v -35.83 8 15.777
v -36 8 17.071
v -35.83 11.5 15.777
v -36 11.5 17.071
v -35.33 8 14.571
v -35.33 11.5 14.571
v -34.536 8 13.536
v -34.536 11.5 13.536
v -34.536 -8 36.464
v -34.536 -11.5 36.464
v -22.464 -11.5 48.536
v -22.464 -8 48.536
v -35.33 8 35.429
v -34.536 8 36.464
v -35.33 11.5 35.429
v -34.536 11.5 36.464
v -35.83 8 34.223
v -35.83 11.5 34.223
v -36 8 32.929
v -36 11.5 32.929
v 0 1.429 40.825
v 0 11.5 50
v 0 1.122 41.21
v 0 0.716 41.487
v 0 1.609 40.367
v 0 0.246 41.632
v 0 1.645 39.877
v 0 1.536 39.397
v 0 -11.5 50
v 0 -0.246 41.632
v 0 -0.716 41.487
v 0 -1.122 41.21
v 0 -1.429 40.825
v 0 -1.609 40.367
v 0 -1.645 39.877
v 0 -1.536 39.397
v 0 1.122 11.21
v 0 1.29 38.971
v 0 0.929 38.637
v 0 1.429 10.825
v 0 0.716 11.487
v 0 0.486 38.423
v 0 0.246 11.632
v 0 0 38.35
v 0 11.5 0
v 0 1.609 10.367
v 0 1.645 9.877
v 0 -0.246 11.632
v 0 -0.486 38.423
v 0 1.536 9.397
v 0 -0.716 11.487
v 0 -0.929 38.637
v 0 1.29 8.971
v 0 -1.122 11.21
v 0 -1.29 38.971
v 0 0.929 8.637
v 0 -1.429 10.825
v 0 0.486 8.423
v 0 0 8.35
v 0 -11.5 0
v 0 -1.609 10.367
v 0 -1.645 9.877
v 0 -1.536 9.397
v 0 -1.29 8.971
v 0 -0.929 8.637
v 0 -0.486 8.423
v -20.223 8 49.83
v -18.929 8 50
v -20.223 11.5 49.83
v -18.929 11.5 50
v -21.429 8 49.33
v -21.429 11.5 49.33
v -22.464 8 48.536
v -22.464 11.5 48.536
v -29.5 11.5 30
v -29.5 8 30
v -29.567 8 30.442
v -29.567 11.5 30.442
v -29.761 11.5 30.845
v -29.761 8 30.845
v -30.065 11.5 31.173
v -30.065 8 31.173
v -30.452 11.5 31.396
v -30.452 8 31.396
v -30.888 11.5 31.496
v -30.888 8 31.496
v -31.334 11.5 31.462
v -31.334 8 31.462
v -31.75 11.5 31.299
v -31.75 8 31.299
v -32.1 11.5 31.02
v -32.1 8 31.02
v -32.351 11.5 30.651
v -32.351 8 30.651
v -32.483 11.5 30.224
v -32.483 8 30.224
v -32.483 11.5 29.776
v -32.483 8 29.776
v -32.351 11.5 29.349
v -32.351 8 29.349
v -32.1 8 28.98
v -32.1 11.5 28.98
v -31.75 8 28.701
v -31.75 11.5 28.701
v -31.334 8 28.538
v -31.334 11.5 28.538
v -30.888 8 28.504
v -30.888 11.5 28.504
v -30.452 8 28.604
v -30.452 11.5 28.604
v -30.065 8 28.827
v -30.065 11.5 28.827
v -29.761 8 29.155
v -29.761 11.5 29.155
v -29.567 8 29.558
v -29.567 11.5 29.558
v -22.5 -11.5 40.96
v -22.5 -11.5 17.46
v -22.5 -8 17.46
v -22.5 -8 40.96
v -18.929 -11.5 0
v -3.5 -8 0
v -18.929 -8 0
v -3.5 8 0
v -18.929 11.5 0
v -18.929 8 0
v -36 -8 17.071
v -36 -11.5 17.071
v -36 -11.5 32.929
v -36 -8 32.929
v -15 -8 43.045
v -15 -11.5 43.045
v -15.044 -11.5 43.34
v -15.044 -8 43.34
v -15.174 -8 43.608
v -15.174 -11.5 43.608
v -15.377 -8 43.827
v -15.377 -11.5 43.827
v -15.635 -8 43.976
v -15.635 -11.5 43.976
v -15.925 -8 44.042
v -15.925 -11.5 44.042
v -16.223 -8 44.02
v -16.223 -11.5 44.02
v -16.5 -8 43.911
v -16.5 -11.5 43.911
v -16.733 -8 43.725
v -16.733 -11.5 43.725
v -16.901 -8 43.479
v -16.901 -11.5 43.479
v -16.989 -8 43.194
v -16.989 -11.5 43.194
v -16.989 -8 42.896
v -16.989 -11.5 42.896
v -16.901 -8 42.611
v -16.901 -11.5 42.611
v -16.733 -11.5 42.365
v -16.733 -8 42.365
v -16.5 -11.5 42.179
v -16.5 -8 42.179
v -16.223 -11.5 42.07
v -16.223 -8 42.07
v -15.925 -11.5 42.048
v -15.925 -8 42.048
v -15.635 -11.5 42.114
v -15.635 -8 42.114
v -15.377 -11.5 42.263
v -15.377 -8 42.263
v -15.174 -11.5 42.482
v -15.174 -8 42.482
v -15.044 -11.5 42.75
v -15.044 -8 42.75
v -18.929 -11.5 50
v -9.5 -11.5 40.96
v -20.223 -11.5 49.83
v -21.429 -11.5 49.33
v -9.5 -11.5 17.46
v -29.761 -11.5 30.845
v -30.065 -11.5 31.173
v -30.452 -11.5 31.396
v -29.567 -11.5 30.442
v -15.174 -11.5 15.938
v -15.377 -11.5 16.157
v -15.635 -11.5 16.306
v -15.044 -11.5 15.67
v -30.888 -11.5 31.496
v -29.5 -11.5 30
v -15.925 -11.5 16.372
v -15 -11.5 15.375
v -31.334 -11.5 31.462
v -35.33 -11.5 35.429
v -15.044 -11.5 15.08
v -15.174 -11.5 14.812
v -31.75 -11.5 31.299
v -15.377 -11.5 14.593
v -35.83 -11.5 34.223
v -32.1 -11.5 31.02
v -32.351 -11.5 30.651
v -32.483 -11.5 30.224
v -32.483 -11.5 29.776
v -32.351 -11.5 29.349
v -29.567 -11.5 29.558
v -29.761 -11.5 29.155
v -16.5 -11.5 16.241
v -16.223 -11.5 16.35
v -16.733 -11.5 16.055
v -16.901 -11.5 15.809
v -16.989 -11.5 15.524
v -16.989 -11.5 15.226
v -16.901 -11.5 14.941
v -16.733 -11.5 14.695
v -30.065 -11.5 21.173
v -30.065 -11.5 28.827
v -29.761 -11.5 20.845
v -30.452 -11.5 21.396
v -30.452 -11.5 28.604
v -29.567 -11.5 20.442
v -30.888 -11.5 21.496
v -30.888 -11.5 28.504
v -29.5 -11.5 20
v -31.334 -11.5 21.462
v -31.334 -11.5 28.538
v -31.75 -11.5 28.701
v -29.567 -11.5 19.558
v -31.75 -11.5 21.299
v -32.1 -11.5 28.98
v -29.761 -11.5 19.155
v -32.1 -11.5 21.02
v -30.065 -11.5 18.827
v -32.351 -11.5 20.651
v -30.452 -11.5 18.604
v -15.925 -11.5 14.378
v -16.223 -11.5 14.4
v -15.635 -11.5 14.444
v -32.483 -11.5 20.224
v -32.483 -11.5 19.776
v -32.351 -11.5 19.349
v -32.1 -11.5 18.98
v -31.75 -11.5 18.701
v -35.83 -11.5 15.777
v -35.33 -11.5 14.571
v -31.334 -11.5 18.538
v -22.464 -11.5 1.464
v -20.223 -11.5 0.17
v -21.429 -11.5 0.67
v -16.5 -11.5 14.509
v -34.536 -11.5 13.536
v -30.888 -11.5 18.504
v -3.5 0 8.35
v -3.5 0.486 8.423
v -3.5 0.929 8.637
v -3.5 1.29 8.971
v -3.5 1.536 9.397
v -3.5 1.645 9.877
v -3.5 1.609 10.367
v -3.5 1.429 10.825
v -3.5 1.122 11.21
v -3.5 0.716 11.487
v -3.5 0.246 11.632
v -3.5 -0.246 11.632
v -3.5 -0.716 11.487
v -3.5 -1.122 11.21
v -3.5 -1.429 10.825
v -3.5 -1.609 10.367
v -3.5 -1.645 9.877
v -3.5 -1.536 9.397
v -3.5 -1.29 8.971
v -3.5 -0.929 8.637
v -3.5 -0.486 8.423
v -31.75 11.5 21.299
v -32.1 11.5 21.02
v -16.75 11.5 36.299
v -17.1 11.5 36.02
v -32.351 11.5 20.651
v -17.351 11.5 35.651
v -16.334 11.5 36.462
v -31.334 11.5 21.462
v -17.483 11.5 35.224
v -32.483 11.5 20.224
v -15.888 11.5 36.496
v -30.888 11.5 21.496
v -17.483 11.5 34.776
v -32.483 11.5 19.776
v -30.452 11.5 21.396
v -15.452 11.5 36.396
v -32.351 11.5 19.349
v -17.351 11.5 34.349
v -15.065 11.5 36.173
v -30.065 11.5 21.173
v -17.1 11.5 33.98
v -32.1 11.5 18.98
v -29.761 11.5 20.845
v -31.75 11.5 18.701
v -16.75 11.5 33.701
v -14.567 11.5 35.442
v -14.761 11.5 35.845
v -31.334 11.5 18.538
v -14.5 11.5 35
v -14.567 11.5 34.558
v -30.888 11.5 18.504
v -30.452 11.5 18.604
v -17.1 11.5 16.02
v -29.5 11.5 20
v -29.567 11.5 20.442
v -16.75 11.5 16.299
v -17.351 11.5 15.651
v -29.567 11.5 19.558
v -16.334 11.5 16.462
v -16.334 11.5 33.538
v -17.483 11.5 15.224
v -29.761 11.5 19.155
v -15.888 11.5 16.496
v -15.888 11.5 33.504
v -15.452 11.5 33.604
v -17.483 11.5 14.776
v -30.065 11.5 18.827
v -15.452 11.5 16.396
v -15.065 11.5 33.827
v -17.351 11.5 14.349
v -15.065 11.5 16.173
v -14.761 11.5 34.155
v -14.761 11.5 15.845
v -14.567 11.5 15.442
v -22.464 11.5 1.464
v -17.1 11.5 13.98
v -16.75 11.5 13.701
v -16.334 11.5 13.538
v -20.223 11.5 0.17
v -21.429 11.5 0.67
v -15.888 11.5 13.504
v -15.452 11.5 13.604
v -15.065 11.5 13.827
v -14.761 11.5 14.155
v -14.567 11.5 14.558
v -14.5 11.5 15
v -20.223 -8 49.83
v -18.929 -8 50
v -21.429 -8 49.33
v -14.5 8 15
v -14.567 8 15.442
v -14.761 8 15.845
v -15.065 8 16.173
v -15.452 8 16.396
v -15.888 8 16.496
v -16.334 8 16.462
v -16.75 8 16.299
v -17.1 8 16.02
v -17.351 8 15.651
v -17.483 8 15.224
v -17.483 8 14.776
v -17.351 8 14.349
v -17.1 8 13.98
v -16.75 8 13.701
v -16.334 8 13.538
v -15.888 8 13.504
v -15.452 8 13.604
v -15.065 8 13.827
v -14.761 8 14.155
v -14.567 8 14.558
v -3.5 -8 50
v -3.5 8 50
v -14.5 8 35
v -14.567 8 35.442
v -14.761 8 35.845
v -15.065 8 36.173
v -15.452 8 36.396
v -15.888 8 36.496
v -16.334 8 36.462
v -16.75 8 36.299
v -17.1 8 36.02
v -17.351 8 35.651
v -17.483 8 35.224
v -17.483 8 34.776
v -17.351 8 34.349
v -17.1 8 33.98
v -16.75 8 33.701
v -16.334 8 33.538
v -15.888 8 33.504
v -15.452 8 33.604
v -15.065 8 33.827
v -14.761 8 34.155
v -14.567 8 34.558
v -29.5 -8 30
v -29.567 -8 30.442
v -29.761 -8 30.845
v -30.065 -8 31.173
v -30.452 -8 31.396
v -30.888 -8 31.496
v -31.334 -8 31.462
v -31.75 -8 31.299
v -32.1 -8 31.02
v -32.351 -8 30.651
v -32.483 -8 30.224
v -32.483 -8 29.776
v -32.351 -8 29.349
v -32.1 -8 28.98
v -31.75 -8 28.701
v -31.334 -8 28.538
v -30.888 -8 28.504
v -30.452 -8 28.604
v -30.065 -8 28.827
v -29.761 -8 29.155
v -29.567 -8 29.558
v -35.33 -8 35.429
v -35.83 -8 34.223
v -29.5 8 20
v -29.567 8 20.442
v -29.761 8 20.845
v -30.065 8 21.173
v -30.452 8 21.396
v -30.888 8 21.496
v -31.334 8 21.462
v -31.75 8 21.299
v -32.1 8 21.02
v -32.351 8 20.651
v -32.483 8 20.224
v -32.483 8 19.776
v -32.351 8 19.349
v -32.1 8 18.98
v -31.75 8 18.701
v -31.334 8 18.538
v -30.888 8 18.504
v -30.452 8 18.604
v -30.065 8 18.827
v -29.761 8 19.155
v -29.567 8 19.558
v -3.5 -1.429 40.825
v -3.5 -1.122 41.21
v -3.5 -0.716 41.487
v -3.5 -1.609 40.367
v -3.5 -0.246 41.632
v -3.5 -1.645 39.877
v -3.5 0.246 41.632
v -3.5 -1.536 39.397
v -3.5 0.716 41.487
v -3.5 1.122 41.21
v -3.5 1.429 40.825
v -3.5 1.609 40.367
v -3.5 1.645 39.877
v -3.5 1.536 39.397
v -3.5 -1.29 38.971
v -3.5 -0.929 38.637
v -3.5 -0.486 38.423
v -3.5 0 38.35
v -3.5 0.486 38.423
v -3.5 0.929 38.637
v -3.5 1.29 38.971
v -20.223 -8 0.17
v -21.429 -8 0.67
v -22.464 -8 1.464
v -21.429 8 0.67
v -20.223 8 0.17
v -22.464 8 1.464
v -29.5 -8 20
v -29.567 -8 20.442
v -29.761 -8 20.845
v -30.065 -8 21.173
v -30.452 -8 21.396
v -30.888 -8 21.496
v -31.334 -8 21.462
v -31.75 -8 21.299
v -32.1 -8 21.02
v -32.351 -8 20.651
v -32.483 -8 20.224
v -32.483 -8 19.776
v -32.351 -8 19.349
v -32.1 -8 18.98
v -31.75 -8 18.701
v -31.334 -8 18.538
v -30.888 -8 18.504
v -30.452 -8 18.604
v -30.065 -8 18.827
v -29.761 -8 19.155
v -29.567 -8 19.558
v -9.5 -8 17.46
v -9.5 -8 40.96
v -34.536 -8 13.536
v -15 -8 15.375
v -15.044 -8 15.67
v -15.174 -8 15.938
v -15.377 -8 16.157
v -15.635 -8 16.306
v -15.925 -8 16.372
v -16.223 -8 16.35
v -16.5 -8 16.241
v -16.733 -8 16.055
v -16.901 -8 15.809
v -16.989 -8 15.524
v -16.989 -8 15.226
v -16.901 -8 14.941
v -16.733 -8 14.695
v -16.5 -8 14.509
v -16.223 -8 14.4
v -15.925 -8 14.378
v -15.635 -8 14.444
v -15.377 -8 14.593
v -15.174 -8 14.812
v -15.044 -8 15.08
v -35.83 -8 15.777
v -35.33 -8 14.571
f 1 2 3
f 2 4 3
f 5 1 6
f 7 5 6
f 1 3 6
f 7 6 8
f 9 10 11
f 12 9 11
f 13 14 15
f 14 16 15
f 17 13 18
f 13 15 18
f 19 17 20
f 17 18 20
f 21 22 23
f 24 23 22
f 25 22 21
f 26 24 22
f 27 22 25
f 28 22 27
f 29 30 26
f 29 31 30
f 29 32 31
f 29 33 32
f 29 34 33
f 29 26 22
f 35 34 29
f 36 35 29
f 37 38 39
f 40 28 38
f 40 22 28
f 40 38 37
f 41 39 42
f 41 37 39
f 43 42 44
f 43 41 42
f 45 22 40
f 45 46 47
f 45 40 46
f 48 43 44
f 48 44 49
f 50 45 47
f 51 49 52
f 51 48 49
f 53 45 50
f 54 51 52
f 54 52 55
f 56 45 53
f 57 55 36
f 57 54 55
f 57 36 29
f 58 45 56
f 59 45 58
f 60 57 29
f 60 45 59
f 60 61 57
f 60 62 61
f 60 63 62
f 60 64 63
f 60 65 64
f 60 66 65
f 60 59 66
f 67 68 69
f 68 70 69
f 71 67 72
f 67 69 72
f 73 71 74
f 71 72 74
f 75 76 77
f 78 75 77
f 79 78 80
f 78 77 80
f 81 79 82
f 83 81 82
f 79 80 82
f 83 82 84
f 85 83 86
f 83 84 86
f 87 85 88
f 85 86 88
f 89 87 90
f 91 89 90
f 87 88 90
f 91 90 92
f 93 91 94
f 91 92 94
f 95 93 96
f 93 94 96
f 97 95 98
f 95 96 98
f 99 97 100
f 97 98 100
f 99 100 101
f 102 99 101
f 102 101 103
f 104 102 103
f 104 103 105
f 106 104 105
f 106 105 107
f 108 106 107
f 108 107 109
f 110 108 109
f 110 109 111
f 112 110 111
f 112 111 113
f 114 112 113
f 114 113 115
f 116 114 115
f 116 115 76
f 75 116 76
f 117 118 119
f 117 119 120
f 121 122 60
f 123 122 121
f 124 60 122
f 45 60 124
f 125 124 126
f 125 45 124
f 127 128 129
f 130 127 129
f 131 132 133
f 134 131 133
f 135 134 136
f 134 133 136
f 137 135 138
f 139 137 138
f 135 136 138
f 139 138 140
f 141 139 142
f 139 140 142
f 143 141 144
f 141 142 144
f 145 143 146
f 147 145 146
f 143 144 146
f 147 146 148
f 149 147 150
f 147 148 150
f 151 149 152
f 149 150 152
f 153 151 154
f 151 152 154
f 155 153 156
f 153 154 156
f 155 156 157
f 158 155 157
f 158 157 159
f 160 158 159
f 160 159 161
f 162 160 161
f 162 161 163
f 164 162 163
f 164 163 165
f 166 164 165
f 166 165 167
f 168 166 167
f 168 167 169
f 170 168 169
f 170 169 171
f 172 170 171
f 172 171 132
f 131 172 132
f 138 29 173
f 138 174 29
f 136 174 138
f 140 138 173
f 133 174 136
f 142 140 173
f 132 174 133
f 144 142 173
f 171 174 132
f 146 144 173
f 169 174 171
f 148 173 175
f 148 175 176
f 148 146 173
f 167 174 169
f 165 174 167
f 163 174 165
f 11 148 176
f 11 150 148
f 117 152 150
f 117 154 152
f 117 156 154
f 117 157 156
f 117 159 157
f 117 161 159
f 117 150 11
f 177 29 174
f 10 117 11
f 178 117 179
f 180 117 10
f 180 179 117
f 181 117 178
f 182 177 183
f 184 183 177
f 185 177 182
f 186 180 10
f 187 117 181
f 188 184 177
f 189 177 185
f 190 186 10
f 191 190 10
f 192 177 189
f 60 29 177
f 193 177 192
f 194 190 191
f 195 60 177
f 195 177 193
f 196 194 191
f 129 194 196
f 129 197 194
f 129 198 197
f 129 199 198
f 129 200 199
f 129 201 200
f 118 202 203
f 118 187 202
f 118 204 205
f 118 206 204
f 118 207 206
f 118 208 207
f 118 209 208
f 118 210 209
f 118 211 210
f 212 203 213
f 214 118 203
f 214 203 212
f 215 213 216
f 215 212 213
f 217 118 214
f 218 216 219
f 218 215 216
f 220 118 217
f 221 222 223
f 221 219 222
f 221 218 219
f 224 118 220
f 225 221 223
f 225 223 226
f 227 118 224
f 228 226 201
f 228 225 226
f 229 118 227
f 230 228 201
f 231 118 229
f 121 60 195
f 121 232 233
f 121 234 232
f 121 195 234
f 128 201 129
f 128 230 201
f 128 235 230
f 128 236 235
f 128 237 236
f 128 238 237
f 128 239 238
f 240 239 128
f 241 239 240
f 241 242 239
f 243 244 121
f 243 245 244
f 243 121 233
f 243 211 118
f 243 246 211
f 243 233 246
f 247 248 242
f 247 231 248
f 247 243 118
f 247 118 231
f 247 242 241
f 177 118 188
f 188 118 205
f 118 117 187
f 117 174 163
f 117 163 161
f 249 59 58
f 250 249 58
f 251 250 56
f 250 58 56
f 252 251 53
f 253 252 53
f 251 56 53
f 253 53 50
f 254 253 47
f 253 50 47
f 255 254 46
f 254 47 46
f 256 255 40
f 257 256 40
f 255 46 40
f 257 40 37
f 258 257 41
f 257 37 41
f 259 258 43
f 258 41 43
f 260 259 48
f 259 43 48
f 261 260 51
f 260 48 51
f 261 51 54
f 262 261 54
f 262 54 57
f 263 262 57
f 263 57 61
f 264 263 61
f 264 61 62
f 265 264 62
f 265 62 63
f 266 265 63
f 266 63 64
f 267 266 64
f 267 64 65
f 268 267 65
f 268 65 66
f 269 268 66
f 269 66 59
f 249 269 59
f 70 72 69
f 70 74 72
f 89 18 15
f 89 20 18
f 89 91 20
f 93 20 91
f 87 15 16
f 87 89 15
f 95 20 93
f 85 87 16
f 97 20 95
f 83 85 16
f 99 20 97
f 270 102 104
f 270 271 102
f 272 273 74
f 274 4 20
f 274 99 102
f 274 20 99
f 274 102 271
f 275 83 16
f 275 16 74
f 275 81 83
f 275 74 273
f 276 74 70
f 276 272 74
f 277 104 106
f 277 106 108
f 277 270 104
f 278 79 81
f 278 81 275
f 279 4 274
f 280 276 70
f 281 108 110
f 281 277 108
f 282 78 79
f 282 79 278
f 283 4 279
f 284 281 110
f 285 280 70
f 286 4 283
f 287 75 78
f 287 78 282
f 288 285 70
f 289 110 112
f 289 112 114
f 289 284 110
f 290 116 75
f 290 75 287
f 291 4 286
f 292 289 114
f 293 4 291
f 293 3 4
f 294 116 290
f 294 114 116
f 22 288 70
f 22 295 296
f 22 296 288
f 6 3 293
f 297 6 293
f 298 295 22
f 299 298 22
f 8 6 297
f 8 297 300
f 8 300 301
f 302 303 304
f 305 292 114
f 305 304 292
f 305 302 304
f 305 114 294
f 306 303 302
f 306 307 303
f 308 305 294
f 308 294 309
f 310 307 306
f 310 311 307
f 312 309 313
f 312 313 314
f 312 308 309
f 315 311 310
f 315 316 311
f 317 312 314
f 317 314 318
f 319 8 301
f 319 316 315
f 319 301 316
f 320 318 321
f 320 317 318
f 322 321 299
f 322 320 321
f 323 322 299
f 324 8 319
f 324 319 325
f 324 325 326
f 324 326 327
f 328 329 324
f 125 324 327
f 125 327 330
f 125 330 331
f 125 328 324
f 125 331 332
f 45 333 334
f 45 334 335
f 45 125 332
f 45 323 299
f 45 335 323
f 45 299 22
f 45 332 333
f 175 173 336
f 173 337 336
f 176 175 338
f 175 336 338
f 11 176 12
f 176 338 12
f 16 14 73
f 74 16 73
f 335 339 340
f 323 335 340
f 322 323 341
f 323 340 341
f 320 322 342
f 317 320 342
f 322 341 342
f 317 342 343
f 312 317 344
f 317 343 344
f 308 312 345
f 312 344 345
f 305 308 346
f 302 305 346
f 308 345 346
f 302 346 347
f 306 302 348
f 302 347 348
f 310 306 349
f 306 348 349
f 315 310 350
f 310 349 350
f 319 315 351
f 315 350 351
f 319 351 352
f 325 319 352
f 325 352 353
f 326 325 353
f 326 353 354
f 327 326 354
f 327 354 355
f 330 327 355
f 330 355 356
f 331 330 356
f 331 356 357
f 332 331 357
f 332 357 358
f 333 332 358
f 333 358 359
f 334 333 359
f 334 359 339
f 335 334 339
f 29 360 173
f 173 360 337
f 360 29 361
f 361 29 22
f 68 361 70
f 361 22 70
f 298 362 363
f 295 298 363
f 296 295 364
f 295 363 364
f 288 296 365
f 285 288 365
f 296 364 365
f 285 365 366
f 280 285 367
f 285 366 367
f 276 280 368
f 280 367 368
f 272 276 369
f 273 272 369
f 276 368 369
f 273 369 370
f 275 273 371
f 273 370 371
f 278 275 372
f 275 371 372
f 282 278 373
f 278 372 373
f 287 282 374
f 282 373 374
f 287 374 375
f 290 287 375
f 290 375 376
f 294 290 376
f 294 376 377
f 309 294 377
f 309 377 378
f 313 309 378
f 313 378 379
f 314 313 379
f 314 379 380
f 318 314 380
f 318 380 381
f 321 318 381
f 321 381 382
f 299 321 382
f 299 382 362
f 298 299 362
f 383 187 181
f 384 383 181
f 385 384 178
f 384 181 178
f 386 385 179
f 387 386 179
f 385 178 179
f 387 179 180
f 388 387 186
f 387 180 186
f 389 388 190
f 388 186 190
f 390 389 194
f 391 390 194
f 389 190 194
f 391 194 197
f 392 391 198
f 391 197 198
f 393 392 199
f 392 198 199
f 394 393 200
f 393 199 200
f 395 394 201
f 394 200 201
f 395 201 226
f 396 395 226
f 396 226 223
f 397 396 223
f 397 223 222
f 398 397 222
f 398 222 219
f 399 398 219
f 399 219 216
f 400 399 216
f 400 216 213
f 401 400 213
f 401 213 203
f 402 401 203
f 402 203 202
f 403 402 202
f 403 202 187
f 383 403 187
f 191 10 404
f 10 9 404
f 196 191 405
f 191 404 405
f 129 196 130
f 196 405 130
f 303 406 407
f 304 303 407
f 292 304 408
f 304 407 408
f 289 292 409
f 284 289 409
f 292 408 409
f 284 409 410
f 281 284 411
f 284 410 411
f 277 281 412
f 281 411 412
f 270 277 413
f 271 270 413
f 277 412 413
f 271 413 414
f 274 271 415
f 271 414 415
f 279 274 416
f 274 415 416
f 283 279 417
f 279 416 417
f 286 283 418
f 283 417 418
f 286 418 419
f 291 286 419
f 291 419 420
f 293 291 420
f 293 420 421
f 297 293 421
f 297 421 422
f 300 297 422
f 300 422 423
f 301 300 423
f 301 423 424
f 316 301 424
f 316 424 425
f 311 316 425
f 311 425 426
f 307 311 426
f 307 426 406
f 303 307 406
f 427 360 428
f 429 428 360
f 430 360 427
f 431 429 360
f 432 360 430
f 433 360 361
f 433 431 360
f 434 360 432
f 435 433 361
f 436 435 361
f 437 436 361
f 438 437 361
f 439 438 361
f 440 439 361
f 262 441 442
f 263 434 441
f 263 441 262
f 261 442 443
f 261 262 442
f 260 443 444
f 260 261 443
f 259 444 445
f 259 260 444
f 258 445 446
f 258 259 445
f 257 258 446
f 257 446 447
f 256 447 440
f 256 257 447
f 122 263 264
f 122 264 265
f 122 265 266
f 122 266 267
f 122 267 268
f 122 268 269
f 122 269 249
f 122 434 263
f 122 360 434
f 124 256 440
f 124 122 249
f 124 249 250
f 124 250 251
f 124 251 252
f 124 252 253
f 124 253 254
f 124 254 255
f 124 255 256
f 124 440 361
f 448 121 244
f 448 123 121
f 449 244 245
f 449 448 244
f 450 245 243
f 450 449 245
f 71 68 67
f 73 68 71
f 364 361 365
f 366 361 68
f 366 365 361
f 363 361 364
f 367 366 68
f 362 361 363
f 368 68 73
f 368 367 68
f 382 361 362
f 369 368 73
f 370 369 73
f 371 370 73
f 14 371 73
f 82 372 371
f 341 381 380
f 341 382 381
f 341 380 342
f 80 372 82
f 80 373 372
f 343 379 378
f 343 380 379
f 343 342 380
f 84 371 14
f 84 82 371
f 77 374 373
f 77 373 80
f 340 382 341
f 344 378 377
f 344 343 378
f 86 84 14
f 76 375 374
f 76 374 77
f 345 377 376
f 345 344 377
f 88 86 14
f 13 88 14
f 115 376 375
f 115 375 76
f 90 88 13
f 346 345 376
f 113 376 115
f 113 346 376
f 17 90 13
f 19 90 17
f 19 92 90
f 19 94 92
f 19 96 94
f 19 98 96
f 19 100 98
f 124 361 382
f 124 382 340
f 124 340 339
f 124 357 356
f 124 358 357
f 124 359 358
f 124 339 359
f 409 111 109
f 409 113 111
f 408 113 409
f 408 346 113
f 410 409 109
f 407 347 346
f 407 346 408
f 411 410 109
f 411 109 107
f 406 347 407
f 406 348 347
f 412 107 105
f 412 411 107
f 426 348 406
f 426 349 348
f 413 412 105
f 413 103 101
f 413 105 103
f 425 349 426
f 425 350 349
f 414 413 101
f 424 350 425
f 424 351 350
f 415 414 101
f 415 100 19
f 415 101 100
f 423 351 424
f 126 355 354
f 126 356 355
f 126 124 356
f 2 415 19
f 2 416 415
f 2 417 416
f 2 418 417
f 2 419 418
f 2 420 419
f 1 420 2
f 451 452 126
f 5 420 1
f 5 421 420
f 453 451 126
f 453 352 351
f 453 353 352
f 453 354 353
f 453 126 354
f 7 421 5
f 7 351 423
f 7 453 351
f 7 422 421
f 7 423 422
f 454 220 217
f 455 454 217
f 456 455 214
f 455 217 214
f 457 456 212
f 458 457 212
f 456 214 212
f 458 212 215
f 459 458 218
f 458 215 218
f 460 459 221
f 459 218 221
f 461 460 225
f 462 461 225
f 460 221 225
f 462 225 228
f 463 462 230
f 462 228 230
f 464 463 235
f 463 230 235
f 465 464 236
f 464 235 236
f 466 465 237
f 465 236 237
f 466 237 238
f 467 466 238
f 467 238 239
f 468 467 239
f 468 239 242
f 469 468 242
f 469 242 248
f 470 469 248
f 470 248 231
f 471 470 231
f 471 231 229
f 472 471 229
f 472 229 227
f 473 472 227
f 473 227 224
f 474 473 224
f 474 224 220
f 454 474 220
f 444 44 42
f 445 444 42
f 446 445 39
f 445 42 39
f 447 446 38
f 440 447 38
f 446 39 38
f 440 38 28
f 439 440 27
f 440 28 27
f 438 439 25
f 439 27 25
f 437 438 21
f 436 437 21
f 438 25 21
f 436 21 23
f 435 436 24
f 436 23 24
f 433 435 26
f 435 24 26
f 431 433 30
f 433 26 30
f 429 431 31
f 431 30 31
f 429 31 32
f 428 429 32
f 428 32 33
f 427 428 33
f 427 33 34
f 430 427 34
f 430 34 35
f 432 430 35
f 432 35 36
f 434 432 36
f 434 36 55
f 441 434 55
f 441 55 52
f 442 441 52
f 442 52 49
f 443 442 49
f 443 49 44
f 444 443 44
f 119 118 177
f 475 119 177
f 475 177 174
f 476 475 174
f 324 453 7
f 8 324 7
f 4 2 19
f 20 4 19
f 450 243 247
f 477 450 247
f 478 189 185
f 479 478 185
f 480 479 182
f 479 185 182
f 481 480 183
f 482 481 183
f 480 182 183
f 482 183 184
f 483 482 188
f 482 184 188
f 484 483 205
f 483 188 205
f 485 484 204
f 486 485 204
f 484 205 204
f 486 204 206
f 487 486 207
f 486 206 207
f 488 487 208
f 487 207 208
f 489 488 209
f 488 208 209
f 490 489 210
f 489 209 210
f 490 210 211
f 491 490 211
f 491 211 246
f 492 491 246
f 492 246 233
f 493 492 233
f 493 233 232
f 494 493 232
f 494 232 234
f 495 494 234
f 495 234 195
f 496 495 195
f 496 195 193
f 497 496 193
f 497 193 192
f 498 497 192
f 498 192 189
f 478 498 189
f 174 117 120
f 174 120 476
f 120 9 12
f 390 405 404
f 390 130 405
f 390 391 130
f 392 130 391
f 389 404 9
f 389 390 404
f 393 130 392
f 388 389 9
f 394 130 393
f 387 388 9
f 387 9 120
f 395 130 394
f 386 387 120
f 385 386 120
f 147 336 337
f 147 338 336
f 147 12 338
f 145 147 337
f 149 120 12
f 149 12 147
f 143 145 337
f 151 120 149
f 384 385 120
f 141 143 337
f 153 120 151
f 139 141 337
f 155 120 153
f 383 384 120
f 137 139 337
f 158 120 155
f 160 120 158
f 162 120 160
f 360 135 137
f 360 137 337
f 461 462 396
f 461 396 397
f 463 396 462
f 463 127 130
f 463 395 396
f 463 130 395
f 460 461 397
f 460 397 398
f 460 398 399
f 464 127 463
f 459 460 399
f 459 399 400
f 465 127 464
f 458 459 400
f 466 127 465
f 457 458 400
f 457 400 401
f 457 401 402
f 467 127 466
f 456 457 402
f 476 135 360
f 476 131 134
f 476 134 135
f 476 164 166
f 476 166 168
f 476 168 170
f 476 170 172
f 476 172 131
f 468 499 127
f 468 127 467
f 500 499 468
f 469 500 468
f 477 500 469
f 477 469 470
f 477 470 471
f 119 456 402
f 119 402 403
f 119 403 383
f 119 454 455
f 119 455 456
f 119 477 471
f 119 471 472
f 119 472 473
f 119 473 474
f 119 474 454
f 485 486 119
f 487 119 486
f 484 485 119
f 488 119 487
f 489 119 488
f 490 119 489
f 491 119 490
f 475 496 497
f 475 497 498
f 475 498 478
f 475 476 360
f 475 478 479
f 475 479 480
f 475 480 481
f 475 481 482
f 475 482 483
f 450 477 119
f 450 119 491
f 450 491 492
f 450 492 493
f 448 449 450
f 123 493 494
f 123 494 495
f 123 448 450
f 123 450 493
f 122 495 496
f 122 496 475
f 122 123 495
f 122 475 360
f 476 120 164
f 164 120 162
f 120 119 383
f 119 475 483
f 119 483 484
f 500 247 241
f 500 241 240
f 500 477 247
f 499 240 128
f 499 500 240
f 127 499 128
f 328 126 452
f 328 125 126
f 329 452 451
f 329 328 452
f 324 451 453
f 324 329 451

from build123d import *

# Parameters (mm, degrees)
EXTRUDE_1_DEPTH     = 50
CUT_EXTRUDE_START   = -19.5
SKETCH_2_R          = 1.5
CUT_EXTRUDE_1_DEPTH = 70
SKETCH_3_OUTSIDE_W  = 61.218
SKETCH_3_OUTSIDE_H  = 66.218
CUT_EXTRUDE_2_DEPTH = 70
SKETCH_2_3_R        = 1.5
CUT_EXTRUDE_4_DEPTH = 10
SKETCH_5_R          = 1
CUT_EXTRUDE_5_DEPTH = 10
FILLET_1_R          = 5
SKETCH_6_W          = 13
SKETCH_6_H          = 23.5
CUT_EXTRUDE_6_DEPTH = 10
SKETCH_7_R          = 1.65
CUT_EXTRUDE_7_DEPTH = 10


with BuildPart() as part:
    # Sketch 1 → Extrude 1 (new body)
    with BuildSketch(Plane.XY):
        Polygon((-45, 11.5), (0, 11.5), (0, -11.5), (-45, -11.5), (-45, -8), (-3.5, -8), (-3.5, 8), (-45, 8), align=None)
    extrude(amount=EXTRUDE_1_DEPTH)

    # Sketch 2 → Cut-Extrude 1 (cut)
    with BuildSketch(Plane.XZ.offset(11.5).offset(CUT_EXTRUDE_START)):
        with Locations((-16, 35)):
            Circle(SKETCH_2_R)
        with Locations((-16, 15)):
            Circle(SKETCH_2_R)
        with Locations((-31, 30)):
            Circle(SKETCH_2_R)
        with Locations((-31, 20)):
            Circle(SKETCH_2_R)
    extrude(amount=-CUT_EXTRUDE_1_DEPTH, mode=Mode.SUBTRACT)

    # Sketch 3 outside → Cut-Extrude 2 (cut)
    with BuildSketch(Plane.XZ.offset(11.5)):
        with Locations((-22.5, 25)):
            Rectangle(SKETCH_3_OUTSIDE_W, SKETCH_3_OUTSIDE_H)
        Polygon((-21, 0), (-36, 15), (-36, 35), (-21, 50), (0, 50), (0, 0), align=None, mode=Mode.SUBTRACT)
    extrude(amount=-CUT_EXTRUDE_2_DEPTH, mode=Mode.SUBTRACT)

    # Sketch 2_3 → Cut-Extrude 4 (cut)
    with BuildSketch(Plane.XZ.offset(11.5)):
        with Locations((-31, 30)):
            Circle(SKETCH_2_3_R)
        with Locations((-31, 20)):
            Circle(SKETCH_2_3_R)
    extrude(amount=-CUT_EXTRUDE_4_DEPTH, mode=Mode.SUBTRACT)

    # Sketch 5 → Cut-Extrude 5 (cut)
    with BuildSketch(Plane.XZ.offset(11.5)):
        with Locations((-16, 43.045)):
            Circle(SKETCH_5_R)
        with Locations((-16, 15.375)):
            Circle(SKETCH_5_R)
    extrude(amount=-CUT_EXTRUDE_5_DEPTH, mode=Mode.SUBTRACT)

    # Fillet 1
    fillet_1_edges = [part.edges().sort_by_distance(p)[0] for p in [
        (-21, -9.75, 0),
        (-21, 9.75, 0),
        (-21, -9.75, 50),
        (-21, 9.75, 50),
        (-36, 9.75, 35),
        (-36, -9.75, 35),
        (-36, 9.75, 15),
        (-36, -9.75, 15),
    ]]
    fillet(fillet_1_edges, radius=FILLET_1_R)

    # Sketch 6 → Cut-Extrude 6 (cut)
    with BuildSketch(Plane.XZ.offset(11.5)):
        with Locations((-16, 29.21)):
            Rectangle(SKETCH_6_W, SKETCH_6_H)
    extrude(amount=-CUT_EXTRUDE_6_DEPTH, mode=Mode.SUBTRACT)

    # Sketch 7 → Cut-Extrude 7 (cut)
    with BuildSketch(Plane(origin=(0, 0, 0), x_dir=(0, 0, -1), z_dir=(1, 0, 0))):
        with Locations((-10, 0)):
            Circle(SKETCH_7_R)
        with Locations((-40, 0)):
            Circle(SKETCH_7_R)
    extrude(amount=-CUT_EXTRUDE_7_DEPTH, mode=Mode.SUBTRACT)


solid = part.part
